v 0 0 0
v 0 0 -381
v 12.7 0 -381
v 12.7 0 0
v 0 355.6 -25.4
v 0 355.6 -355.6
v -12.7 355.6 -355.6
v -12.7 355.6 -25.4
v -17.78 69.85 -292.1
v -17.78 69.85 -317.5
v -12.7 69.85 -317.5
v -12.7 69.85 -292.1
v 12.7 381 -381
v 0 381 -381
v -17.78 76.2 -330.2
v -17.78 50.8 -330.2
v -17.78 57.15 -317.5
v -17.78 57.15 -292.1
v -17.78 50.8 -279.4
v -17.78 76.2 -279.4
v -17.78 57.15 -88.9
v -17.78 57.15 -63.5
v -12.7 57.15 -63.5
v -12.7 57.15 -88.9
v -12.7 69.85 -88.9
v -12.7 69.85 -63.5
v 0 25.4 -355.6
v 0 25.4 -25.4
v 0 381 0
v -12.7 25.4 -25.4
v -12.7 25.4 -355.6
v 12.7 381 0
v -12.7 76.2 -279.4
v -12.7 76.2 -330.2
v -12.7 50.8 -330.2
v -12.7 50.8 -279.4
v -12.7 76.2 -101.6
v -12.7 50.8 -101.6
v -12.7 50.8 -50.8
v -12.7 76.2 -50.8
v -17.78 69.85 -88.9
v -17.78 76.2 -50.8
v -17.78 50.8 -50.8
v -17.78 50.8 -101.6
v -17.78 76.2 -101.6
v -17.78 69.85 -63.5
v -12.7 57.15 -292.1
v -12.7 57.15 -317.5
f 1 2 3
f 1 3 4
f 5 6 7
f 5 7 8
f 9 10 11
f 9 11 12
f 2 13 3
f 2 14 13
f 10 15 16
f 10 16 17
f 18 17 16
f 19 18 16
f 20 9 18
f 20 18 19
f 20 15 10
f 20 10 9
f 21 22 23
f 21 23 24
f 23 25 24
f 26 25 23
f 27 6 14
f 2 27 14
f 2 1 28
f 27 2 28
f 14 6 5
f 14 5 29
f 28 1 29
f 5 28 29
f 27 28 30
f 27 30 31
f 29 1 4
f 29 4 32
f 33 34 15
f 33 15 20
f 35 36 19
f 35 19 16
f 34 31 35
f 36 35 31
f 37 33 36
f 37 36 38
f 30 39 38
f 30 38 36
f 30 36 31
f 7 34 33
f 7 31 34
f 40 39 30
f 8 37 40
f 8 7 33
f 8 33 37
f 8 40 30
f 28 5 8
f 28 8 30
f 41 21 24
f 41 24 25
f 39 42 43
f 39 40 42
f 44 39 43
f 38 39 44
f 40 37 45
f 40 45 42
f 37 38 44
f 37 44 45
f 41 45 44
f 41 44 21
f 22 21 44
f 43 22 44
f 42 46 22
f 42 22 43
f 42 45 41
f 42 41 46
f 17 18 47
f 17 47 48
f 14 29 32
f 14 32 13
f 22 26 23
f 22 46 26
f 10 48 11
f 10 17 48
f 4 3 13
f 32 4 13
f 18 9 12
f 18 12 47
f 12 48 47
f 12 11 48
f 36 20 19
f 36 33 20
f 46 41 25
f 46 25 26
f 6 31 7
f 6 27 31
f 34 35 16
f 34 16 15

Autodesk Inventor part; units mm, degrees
ref_plane "YZ Plane" through (0, 0, 0) normal (1, 0, 0) x (0, 1, 0)
ref_plane "XZ Plane" through (0, 0, 0) normal (0, 1, 0) x (-1, 0, 0)
ref_plane "XY Plane" through (0, 0, 0) normal (0, 0, 1) x (1, 0, 0)
sketch "Sketch1" plane through (0, 0, 0) normal (1, 0, 0) x (0, 1, 0)
  line L0 (0, 0) -> (381, 0)
  line L1 (381, 0) -> (381, -381)
  line L2 (381, -381) -> (0, -381)
  line L3 (0, -381) -> (0, 0)
  dimension "d0" = 381
  dimension "d1" = 381
extrude "Extrusion1" add sketch "Sketch1" along normal blind 12.7
sketch "Sketch2" plane through (0, 0, 0) normal (-1, 0, 0) x (0, 0, 1)
  line L0 (-355.6, 355.6) -> (-25.4, 355.6)
  line L1 (-25.4, 355.6) -> (-25.4, 25.4)
  line L2 (-25.4, 25.4) -> (-355.6, 25.4)
  line L3 (-355.6, 25.4) -> (-355.6, 355.6)
  line L4 (-381, 0) -> (-381, 381) projected
  line L5 (0, 381) -> (0, 0) projected
  line L6 (0, 0) -> (-381, 0) projected
  line L7 (-381, 381) -> (0, 381) projected
  dimension "d4" = 25.4
  dimension "d5" = 25.4
  dimension "d6" = 25.4
  dimension "d7" = 25.4
extrude "Extrusion2" add sketch "Sketch2" along normal blind 12.7 contours L0 L1 L2 L3
sketch "Sketch3" plane through (-12.7, 0, 0) normal (-1, 0, 0) x (0, 0, 1)
  line L0 (-330.2, 76.2) -> (-279.4, 76.2)
  line L1 (-279.4, 76.2) -> (-279.4, 50.8)
  line L2 (-279.4, 50.8) -> (-330.2, 50.8)
  line L3 (-330.2, 50.8) -> (-330.2, 76.2)
  line L4 (-355.6, 355.6) -> (-355.6, 25.4) projected
  line L5 (-355.6, 25.4) -> (-25.4, 25.4) projected
  point P0 (0, 0)
  dimension "d10" = 25.4
  dimension "d11" = 25.4
  dimension "d12" = 25.4
  dimension "d13" = 50.8
extrude "Extrusion3" add sketch "Sketch3" along normal blind 5.08
sketch "Sketch4" plane through (-12.7, 0, 0) normal (-1, 0, 0) x (0, 0, 1)
  line L0 (-101.6, 76.2) -> (-50.8, 76.2)
  line L1 (-50.8, 76.2) -> (-50.8, 50.8)
  line L2 (-50.8, 50.8) -> (-101.6, 50.8)
  line L3 (-101.6, 50.8) -> (-101.6, 76.2)
  line L4 (-25.4, 25.4) -> (-25.4, 355.6) projected
  line L5 (-355.6, 25.4) -> (-25.4, 25.4) projected
  point P0 (0, 0)
  dimension "d16" = 25.4
  dimension "d17" = 25.4
  dimension "d18" = 25.4
  dimension "d19" = 50.8
extrude "Extrusion4" add sketch "Sketch4" along normal blind 5.08
sketch "Sketch5" plane through (-17.78, 0, 0) normal (-1, 0, 0) x (0, 0, 1)
  line L0 (-317.5, 69.85) -> (-292.1, 69.85)
  line L1 (-292.1, 69.85) -> (-292.1, 57.15)
  line L2 (-292.1, 57.15) -> (-317.5, 57.15)
  line L3 (-317.5, 57.15) -> (-317.5, 69.85)
  line L4 (-279.4, 50.8) -> (-279.4, 76.2) projected
  line L5 (-330.2, 76.2) -> (-330.2, 50.8) projected
  line L6 (-279.4, 76.2) -> (-330.2, 76.2) projected
  line L7 (-330.2, 50.8) -> (-279.4, 50.8) projected
  point P0 (0, 0)
  dimension "d22" = 12.7
  dimension "d23" = 12.7
  dimension "d24" = 6.35
  dimension "d25" = 6.35
extrude "Extrusion5" cut sketch "Sketch5" against normal blind 5.08 contours L0 L1 L2 L3
sketch "Sketch6" plane through (-17.78, 0, 0) normal (-1, 0, 0) x (0, 0, 1)
  line L0 (-88.9, 69.85) -> (-63.5, 69.85)
  line L1 (-63.5, 69.85) -> (-63.5, 57.15)
  line L2 (-63.5, 57.15) -> (-88.9, 57.15)
  line L3 (-88.9, 57.15) -> (-88.9, 69.85)
  line L4 (-101.6, 76.2) -> (-101.6, 50.8) projected
  line L5 (-50.8, 50.8) -> (-50.8, 76.2) projected
  line L6 (-50.8, 76.2) -> (-101.6, 76.2) projected
  line L7 (-101.6, 50.8) -> (-50.8, 50.8) projected
  point P0 (0, 0)
  dimension "d28" = 12.7
  dimension "d29" = 12.7
  dimension "d30" = 6.35
  dimension "d31" = 6.35
extrude "Extrusion6" cut sketch "Sketch6" against normal blind 5.08 contours L0 L1 L2 L3
properties part number "front"
